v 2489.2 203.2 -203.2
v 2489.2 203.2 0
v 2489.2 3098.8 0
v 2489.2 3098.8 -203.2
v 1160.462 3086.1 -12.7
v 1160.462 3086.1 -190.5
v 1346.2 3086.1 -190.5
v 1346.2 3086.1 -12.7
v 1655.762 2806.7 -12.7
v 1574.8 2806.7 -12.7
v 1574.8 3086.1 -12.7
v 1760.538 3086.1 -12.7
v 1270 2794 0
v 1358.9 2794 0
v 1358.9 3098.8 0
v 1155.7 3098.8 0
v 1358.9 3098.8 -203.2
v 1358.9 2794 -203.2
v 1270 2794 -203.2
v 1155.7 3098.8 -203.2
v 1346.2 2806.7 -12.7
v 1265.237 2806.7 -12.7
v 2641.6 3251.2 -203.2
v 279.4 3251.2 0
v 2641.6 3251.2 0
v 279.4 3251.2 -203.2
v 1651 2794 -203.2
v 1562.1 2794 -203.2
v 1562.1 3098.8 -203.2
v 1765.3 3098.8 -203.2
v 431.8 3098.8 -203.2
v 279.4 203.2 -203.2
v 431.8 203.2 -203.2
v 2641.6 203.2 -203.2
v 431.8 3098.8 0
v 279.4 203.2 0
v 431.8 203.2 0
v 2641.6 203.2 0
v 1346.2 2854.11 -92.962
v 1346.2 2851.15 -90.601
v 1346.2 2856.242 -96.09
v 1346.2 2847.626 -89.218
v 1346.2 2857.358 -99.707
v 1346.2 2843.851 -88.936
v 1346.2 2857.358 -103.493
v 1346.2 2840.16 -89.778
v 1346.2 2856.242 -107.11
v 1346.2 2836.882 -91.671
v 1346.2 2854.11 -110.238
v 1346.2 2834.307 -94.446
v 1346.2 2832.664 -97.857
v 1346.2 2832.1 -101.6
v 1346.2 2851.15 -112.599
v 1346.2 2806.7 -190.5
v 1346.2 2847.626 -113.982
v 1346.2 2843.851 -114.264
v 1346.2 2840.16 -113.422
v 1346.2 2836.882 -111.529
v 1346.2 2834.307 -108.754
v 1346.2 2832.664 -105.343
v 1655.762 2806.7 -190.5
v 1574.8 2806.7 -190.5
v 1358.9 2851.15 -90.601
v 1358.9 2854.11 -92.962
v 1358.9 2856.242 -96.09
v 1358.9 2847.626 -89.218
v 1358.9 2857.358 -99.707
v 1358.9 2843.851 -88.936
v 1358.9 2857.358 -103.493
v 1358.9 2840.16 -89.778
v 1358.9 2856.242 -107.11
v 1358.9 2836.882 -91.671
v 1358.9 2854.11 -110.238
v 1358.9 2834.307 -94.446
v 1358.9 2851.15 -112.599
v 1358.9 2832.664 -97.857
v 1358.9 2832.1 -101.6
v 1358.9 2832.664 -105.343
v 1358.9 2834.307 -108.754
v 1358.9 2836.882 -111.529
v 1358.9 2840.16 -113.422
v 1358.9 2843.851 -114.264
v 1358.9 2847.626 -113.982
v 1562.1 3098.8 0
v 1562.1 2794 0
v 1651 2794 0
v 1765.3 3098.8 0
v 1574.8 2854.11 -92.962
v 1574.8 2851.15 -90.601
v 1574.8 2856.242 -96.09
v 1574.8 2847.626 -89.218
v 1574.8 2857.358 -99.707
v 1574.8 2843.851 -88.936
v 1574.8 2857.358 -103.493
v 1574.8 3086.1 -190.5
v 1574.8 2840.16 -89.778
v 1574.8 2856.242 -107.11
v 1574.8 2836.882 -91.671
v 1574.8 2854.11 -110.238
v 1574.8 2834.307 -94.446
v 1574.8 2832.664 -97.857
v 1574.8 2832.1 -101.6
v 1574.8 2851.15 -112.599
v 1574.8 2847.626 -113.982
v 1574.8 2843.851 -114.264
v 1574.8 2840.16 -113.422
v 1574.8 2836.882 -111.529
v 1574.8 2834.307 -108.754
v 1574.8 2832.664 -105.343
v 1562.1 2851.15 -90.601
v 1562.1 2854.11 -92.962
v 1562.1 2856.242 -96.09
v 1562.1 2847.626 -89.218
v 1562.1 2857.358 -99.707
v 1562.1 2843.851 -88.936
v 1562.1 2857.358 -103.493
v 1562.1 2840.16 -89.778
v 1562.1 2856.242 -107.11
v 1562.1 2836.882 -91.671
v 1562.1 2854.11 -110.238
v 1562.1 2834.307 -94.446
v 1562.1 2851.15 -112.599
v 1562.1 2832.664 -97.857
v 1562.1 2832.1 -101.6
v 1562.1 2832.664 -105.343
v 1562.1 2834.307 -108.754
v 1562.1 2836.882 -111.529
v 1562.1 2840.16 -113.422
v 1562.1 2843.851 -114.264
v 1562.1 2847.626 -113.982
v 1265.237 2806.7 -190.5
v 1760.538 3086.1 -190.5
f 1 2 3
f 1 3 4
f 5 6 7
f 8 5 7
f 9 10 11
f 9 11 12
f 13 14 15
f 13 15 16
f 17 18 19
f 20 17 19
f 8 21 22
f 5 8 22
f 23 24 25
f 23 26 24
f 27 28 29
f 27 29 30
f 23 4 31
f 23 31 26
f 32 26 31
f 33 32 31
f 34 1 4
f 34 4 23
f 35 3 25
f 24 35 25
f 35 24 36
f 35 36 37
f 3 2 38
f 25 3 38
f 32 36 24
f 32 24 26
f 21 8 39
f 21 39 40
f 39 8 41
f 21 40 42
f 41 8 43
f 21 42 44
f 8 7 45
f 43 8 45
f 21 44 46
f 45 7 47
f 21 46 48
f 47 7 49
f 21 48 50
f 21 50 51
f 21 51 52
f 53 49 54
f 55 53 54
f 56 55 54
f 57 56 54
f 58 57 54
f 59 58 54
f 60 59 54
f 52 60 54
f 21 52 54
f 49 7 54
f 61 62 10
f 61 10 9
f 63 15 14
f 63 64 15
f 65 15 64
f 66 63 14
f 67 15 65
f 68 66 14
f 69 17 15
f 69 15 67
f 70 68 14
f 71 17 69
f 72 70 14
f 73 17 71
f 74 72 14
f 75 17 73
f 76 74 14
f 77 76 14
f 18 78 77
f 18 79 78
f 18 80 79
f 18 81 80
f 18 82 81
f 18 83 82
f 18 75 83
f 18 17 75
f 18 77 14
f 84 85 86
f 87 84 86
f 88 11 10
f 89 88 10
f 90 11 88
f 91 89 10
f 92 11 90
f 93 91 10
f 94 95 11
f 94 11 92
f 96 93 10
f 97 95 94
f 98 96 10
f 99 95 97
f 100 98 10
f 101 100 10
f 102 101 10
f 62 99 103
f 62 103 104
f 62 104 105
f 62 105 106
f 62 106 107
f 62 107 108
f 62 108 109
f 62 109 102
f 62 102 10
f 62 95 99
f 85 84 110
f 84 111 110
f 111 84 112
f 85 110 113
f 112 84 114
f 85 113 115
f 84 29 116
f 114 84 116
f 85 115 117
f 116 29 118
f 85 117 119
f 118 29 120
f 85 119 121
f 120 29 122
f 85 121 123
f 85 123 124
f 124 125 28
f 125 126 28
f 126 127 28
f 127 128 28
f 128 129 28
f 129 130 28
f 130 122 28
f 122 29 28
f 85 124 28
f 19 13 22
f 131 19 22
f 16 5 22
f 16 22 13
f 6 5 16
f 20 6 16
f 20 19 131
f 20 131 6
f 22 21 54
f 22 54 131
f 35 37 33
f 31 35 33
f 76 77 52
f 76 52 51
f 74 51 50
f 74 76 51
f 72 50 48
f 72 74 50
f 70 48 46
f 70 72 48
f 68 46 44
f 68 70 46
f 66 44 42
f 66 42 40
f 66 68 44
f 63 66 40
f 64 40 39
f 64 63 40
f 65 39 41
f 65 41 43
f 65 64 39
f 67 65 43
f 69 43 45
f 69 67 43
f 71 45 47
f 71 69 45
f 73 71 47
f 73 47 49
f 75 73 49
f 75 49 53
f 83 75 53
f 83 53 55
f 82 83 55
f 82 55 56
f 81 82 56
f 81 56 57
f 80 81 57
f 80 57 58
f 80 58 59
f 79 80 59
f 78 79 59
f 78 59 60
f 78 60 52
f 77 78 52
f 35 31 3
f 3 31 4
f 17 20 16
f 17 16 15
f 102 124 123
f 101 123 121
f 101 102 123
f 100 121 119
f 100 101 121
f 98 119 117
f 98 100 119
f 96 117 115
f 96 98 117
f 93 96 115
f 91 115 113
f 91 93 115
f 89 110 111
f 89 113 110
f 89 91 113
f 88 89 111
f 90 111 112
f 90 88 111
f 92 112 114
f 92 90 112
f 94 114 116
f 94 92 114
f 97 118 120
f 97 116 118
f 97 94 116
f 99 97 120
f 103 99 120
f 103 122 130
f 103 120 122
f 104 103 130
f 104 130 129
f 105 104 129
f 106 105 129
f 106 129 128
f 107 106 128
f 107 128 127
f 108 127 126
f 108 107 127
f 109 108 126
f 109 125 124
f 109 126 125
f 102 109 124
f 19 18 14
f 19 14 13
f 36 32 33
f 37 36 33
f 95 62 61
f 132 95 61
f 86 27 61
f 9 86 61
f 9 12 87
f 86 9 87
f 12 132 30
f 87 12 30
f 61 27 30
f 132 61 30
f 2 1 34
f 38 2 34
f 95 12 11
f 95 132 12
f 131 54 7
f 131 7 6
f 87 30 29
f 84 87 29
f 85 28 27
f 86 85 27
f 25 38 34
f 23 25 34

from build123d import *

# Parameters (mm, degrees)
STOCK_HULL_1_START       = 203.2
STOCK_HULL_1_OUTLINE_W   = 152.4
STOCK_HULL_1_OUTLINE_H   = 203.2
STOCK_HULL_1_DEPTH       = 3048
STOCK_HULL_1_START_2     = 3098.8
STOCK_HULL_1_2_OUTLINE_W = 2057.4
STOCK_HULL_1_2_OUTLINE_H = 203.2
STOCK_HULL_1_2_DEPTH     = 152.4
BOSS_EXTRUDE1_DEPTH      = 203.2
BOSS_EXTRUDE1_2_DEPTH    = 203.2
SHELL1_T                 = -12.7
SHELL2_T                 = -12.7
CUT_EXTRUDE1_START       = -228.6
SKETCH4_R                = 12.7
CUT_EXTRUDE1_DEPTH       = 228.6


# Read off the part's stored shape, not the designer's step: Stock-Hull-1
with BuildPart() as part:
    # Stock-Hull-1 outline → Stock-Hull-1 (new body)
    with BuildSketch(Plane(origin=(0, 0, 0), x_dir=(1, 0, 0), z_dir=(0, 1, 0)).offset(STOCK_HULL_1_START)):
        with Locations((355.6, 101.6)):
            Rectangle(STOCK_HULL_1_OUTLINE_W, STOCK_HULL_1_OUTLINE_H)
        with Locations((2565.4, 101.6)):
            Rectangle(STOCK_HULL_1_OUTLINE_W, STOCK_HULL_1_OUTLINE_H)
    extrude(amount=STOCK_HULL_1_DEPTH)

    # Stock-Hull-1 2 outline → Stock-Hull-1 2 (add)
    with BuildSketch(Plane(origin=(0, 0, 0), x_dir=(1, 0, 0), z_dir=(0, 1, 0)).offset(STOCK_HULL_1_START_2)):
        with Locations((1460.5, 101.6)):
            Rectangle(STOCK_HULL_1_2_OUTLINE_W, STOCK_HULL_1_2_OUTLINE_H)
    extrude(amount=STOCK_HULL_1_2_DEPTH)


with BuildPart() as body_2:
    # Sketch1 → Boss-Extrude1 (new body)
    with BuildSketch(Plane(origin=(0, 0, -203.2), x_dir=(-1, 0, 0), z_dir=(0, 0, -1))):
        Polygon((-1562.1, 3098.8), (-1562.1, 2794), (-1651, 2794), (-1765.3, 3098.8), align=None)
    extrude(amount=-BOSS_EXTRUDE1_DEPTH)

    # Shell1
    shell1_openings = [body_2.faces().sort_by_distance(p)[0] for p in [
        (1708.15, 2946.4, -101.6),
    ]]
    offset(amount=SHELL1_T, openings=shell1_openings, kind=Kind.INTERSECTION)


with BuildPart() as body_3:
    # Sketch1 → Boss-Extrude1 2 (new body)
    with BuildSketch(Plane(origin=(0, 0, -203.2), x_dir=(-1, 0, 0), z_dir=(0, 0, -1))):
        Polygon((-1358.9, 3098.8), (-1358.9, 2794), (-1270, 2794), (-1155.7, 3098.8), align=None)
    extrude(amount=-BOSS_EXTRUDE1_2_DEPTH)

    # Shell2
    shell2_openings = [body_3.faces().sort_by_distance(p)[0] for p in [
        (1212.85, 2946.4, -101.6),
    ]]
    offset(amount=SHELL2_T, openings=shell2_openings, kind=Kind.INTERSECTION)


with BuildPart() as cut_extrude1_tool:
    # Sketch4 → Cut-Extrude1 (new body)
    with BuildSketch(Plane.ZY.offset(-1346.2).offset(CUT_EXTRUDE1_START)):
        with Locations(Location((-101.6, 2844.8, 0), (0, 0, 270))):
            Circle(SKETCH4_R)
    extrude(amount=CUT_EXTRUDE1_DEPTH)


with BuildPart() as body_2_1:
    add(body_2.part)

    # Cut-Extrude1: cut by cut_extrude1_tool
    add(cut_extrude1_tool.part, mode=Mode.SUBTRACT)


with BuildPart() as body_3_1:
    add(body_3.part)

    # Cut-Extrude1: cut by cut_extrude1_tool
    add(cut_extrude1_tool.part, mode=Mode.SUBTRACT)


solid = Compound([part.part, body_2_1.part, body_3_1.part])
